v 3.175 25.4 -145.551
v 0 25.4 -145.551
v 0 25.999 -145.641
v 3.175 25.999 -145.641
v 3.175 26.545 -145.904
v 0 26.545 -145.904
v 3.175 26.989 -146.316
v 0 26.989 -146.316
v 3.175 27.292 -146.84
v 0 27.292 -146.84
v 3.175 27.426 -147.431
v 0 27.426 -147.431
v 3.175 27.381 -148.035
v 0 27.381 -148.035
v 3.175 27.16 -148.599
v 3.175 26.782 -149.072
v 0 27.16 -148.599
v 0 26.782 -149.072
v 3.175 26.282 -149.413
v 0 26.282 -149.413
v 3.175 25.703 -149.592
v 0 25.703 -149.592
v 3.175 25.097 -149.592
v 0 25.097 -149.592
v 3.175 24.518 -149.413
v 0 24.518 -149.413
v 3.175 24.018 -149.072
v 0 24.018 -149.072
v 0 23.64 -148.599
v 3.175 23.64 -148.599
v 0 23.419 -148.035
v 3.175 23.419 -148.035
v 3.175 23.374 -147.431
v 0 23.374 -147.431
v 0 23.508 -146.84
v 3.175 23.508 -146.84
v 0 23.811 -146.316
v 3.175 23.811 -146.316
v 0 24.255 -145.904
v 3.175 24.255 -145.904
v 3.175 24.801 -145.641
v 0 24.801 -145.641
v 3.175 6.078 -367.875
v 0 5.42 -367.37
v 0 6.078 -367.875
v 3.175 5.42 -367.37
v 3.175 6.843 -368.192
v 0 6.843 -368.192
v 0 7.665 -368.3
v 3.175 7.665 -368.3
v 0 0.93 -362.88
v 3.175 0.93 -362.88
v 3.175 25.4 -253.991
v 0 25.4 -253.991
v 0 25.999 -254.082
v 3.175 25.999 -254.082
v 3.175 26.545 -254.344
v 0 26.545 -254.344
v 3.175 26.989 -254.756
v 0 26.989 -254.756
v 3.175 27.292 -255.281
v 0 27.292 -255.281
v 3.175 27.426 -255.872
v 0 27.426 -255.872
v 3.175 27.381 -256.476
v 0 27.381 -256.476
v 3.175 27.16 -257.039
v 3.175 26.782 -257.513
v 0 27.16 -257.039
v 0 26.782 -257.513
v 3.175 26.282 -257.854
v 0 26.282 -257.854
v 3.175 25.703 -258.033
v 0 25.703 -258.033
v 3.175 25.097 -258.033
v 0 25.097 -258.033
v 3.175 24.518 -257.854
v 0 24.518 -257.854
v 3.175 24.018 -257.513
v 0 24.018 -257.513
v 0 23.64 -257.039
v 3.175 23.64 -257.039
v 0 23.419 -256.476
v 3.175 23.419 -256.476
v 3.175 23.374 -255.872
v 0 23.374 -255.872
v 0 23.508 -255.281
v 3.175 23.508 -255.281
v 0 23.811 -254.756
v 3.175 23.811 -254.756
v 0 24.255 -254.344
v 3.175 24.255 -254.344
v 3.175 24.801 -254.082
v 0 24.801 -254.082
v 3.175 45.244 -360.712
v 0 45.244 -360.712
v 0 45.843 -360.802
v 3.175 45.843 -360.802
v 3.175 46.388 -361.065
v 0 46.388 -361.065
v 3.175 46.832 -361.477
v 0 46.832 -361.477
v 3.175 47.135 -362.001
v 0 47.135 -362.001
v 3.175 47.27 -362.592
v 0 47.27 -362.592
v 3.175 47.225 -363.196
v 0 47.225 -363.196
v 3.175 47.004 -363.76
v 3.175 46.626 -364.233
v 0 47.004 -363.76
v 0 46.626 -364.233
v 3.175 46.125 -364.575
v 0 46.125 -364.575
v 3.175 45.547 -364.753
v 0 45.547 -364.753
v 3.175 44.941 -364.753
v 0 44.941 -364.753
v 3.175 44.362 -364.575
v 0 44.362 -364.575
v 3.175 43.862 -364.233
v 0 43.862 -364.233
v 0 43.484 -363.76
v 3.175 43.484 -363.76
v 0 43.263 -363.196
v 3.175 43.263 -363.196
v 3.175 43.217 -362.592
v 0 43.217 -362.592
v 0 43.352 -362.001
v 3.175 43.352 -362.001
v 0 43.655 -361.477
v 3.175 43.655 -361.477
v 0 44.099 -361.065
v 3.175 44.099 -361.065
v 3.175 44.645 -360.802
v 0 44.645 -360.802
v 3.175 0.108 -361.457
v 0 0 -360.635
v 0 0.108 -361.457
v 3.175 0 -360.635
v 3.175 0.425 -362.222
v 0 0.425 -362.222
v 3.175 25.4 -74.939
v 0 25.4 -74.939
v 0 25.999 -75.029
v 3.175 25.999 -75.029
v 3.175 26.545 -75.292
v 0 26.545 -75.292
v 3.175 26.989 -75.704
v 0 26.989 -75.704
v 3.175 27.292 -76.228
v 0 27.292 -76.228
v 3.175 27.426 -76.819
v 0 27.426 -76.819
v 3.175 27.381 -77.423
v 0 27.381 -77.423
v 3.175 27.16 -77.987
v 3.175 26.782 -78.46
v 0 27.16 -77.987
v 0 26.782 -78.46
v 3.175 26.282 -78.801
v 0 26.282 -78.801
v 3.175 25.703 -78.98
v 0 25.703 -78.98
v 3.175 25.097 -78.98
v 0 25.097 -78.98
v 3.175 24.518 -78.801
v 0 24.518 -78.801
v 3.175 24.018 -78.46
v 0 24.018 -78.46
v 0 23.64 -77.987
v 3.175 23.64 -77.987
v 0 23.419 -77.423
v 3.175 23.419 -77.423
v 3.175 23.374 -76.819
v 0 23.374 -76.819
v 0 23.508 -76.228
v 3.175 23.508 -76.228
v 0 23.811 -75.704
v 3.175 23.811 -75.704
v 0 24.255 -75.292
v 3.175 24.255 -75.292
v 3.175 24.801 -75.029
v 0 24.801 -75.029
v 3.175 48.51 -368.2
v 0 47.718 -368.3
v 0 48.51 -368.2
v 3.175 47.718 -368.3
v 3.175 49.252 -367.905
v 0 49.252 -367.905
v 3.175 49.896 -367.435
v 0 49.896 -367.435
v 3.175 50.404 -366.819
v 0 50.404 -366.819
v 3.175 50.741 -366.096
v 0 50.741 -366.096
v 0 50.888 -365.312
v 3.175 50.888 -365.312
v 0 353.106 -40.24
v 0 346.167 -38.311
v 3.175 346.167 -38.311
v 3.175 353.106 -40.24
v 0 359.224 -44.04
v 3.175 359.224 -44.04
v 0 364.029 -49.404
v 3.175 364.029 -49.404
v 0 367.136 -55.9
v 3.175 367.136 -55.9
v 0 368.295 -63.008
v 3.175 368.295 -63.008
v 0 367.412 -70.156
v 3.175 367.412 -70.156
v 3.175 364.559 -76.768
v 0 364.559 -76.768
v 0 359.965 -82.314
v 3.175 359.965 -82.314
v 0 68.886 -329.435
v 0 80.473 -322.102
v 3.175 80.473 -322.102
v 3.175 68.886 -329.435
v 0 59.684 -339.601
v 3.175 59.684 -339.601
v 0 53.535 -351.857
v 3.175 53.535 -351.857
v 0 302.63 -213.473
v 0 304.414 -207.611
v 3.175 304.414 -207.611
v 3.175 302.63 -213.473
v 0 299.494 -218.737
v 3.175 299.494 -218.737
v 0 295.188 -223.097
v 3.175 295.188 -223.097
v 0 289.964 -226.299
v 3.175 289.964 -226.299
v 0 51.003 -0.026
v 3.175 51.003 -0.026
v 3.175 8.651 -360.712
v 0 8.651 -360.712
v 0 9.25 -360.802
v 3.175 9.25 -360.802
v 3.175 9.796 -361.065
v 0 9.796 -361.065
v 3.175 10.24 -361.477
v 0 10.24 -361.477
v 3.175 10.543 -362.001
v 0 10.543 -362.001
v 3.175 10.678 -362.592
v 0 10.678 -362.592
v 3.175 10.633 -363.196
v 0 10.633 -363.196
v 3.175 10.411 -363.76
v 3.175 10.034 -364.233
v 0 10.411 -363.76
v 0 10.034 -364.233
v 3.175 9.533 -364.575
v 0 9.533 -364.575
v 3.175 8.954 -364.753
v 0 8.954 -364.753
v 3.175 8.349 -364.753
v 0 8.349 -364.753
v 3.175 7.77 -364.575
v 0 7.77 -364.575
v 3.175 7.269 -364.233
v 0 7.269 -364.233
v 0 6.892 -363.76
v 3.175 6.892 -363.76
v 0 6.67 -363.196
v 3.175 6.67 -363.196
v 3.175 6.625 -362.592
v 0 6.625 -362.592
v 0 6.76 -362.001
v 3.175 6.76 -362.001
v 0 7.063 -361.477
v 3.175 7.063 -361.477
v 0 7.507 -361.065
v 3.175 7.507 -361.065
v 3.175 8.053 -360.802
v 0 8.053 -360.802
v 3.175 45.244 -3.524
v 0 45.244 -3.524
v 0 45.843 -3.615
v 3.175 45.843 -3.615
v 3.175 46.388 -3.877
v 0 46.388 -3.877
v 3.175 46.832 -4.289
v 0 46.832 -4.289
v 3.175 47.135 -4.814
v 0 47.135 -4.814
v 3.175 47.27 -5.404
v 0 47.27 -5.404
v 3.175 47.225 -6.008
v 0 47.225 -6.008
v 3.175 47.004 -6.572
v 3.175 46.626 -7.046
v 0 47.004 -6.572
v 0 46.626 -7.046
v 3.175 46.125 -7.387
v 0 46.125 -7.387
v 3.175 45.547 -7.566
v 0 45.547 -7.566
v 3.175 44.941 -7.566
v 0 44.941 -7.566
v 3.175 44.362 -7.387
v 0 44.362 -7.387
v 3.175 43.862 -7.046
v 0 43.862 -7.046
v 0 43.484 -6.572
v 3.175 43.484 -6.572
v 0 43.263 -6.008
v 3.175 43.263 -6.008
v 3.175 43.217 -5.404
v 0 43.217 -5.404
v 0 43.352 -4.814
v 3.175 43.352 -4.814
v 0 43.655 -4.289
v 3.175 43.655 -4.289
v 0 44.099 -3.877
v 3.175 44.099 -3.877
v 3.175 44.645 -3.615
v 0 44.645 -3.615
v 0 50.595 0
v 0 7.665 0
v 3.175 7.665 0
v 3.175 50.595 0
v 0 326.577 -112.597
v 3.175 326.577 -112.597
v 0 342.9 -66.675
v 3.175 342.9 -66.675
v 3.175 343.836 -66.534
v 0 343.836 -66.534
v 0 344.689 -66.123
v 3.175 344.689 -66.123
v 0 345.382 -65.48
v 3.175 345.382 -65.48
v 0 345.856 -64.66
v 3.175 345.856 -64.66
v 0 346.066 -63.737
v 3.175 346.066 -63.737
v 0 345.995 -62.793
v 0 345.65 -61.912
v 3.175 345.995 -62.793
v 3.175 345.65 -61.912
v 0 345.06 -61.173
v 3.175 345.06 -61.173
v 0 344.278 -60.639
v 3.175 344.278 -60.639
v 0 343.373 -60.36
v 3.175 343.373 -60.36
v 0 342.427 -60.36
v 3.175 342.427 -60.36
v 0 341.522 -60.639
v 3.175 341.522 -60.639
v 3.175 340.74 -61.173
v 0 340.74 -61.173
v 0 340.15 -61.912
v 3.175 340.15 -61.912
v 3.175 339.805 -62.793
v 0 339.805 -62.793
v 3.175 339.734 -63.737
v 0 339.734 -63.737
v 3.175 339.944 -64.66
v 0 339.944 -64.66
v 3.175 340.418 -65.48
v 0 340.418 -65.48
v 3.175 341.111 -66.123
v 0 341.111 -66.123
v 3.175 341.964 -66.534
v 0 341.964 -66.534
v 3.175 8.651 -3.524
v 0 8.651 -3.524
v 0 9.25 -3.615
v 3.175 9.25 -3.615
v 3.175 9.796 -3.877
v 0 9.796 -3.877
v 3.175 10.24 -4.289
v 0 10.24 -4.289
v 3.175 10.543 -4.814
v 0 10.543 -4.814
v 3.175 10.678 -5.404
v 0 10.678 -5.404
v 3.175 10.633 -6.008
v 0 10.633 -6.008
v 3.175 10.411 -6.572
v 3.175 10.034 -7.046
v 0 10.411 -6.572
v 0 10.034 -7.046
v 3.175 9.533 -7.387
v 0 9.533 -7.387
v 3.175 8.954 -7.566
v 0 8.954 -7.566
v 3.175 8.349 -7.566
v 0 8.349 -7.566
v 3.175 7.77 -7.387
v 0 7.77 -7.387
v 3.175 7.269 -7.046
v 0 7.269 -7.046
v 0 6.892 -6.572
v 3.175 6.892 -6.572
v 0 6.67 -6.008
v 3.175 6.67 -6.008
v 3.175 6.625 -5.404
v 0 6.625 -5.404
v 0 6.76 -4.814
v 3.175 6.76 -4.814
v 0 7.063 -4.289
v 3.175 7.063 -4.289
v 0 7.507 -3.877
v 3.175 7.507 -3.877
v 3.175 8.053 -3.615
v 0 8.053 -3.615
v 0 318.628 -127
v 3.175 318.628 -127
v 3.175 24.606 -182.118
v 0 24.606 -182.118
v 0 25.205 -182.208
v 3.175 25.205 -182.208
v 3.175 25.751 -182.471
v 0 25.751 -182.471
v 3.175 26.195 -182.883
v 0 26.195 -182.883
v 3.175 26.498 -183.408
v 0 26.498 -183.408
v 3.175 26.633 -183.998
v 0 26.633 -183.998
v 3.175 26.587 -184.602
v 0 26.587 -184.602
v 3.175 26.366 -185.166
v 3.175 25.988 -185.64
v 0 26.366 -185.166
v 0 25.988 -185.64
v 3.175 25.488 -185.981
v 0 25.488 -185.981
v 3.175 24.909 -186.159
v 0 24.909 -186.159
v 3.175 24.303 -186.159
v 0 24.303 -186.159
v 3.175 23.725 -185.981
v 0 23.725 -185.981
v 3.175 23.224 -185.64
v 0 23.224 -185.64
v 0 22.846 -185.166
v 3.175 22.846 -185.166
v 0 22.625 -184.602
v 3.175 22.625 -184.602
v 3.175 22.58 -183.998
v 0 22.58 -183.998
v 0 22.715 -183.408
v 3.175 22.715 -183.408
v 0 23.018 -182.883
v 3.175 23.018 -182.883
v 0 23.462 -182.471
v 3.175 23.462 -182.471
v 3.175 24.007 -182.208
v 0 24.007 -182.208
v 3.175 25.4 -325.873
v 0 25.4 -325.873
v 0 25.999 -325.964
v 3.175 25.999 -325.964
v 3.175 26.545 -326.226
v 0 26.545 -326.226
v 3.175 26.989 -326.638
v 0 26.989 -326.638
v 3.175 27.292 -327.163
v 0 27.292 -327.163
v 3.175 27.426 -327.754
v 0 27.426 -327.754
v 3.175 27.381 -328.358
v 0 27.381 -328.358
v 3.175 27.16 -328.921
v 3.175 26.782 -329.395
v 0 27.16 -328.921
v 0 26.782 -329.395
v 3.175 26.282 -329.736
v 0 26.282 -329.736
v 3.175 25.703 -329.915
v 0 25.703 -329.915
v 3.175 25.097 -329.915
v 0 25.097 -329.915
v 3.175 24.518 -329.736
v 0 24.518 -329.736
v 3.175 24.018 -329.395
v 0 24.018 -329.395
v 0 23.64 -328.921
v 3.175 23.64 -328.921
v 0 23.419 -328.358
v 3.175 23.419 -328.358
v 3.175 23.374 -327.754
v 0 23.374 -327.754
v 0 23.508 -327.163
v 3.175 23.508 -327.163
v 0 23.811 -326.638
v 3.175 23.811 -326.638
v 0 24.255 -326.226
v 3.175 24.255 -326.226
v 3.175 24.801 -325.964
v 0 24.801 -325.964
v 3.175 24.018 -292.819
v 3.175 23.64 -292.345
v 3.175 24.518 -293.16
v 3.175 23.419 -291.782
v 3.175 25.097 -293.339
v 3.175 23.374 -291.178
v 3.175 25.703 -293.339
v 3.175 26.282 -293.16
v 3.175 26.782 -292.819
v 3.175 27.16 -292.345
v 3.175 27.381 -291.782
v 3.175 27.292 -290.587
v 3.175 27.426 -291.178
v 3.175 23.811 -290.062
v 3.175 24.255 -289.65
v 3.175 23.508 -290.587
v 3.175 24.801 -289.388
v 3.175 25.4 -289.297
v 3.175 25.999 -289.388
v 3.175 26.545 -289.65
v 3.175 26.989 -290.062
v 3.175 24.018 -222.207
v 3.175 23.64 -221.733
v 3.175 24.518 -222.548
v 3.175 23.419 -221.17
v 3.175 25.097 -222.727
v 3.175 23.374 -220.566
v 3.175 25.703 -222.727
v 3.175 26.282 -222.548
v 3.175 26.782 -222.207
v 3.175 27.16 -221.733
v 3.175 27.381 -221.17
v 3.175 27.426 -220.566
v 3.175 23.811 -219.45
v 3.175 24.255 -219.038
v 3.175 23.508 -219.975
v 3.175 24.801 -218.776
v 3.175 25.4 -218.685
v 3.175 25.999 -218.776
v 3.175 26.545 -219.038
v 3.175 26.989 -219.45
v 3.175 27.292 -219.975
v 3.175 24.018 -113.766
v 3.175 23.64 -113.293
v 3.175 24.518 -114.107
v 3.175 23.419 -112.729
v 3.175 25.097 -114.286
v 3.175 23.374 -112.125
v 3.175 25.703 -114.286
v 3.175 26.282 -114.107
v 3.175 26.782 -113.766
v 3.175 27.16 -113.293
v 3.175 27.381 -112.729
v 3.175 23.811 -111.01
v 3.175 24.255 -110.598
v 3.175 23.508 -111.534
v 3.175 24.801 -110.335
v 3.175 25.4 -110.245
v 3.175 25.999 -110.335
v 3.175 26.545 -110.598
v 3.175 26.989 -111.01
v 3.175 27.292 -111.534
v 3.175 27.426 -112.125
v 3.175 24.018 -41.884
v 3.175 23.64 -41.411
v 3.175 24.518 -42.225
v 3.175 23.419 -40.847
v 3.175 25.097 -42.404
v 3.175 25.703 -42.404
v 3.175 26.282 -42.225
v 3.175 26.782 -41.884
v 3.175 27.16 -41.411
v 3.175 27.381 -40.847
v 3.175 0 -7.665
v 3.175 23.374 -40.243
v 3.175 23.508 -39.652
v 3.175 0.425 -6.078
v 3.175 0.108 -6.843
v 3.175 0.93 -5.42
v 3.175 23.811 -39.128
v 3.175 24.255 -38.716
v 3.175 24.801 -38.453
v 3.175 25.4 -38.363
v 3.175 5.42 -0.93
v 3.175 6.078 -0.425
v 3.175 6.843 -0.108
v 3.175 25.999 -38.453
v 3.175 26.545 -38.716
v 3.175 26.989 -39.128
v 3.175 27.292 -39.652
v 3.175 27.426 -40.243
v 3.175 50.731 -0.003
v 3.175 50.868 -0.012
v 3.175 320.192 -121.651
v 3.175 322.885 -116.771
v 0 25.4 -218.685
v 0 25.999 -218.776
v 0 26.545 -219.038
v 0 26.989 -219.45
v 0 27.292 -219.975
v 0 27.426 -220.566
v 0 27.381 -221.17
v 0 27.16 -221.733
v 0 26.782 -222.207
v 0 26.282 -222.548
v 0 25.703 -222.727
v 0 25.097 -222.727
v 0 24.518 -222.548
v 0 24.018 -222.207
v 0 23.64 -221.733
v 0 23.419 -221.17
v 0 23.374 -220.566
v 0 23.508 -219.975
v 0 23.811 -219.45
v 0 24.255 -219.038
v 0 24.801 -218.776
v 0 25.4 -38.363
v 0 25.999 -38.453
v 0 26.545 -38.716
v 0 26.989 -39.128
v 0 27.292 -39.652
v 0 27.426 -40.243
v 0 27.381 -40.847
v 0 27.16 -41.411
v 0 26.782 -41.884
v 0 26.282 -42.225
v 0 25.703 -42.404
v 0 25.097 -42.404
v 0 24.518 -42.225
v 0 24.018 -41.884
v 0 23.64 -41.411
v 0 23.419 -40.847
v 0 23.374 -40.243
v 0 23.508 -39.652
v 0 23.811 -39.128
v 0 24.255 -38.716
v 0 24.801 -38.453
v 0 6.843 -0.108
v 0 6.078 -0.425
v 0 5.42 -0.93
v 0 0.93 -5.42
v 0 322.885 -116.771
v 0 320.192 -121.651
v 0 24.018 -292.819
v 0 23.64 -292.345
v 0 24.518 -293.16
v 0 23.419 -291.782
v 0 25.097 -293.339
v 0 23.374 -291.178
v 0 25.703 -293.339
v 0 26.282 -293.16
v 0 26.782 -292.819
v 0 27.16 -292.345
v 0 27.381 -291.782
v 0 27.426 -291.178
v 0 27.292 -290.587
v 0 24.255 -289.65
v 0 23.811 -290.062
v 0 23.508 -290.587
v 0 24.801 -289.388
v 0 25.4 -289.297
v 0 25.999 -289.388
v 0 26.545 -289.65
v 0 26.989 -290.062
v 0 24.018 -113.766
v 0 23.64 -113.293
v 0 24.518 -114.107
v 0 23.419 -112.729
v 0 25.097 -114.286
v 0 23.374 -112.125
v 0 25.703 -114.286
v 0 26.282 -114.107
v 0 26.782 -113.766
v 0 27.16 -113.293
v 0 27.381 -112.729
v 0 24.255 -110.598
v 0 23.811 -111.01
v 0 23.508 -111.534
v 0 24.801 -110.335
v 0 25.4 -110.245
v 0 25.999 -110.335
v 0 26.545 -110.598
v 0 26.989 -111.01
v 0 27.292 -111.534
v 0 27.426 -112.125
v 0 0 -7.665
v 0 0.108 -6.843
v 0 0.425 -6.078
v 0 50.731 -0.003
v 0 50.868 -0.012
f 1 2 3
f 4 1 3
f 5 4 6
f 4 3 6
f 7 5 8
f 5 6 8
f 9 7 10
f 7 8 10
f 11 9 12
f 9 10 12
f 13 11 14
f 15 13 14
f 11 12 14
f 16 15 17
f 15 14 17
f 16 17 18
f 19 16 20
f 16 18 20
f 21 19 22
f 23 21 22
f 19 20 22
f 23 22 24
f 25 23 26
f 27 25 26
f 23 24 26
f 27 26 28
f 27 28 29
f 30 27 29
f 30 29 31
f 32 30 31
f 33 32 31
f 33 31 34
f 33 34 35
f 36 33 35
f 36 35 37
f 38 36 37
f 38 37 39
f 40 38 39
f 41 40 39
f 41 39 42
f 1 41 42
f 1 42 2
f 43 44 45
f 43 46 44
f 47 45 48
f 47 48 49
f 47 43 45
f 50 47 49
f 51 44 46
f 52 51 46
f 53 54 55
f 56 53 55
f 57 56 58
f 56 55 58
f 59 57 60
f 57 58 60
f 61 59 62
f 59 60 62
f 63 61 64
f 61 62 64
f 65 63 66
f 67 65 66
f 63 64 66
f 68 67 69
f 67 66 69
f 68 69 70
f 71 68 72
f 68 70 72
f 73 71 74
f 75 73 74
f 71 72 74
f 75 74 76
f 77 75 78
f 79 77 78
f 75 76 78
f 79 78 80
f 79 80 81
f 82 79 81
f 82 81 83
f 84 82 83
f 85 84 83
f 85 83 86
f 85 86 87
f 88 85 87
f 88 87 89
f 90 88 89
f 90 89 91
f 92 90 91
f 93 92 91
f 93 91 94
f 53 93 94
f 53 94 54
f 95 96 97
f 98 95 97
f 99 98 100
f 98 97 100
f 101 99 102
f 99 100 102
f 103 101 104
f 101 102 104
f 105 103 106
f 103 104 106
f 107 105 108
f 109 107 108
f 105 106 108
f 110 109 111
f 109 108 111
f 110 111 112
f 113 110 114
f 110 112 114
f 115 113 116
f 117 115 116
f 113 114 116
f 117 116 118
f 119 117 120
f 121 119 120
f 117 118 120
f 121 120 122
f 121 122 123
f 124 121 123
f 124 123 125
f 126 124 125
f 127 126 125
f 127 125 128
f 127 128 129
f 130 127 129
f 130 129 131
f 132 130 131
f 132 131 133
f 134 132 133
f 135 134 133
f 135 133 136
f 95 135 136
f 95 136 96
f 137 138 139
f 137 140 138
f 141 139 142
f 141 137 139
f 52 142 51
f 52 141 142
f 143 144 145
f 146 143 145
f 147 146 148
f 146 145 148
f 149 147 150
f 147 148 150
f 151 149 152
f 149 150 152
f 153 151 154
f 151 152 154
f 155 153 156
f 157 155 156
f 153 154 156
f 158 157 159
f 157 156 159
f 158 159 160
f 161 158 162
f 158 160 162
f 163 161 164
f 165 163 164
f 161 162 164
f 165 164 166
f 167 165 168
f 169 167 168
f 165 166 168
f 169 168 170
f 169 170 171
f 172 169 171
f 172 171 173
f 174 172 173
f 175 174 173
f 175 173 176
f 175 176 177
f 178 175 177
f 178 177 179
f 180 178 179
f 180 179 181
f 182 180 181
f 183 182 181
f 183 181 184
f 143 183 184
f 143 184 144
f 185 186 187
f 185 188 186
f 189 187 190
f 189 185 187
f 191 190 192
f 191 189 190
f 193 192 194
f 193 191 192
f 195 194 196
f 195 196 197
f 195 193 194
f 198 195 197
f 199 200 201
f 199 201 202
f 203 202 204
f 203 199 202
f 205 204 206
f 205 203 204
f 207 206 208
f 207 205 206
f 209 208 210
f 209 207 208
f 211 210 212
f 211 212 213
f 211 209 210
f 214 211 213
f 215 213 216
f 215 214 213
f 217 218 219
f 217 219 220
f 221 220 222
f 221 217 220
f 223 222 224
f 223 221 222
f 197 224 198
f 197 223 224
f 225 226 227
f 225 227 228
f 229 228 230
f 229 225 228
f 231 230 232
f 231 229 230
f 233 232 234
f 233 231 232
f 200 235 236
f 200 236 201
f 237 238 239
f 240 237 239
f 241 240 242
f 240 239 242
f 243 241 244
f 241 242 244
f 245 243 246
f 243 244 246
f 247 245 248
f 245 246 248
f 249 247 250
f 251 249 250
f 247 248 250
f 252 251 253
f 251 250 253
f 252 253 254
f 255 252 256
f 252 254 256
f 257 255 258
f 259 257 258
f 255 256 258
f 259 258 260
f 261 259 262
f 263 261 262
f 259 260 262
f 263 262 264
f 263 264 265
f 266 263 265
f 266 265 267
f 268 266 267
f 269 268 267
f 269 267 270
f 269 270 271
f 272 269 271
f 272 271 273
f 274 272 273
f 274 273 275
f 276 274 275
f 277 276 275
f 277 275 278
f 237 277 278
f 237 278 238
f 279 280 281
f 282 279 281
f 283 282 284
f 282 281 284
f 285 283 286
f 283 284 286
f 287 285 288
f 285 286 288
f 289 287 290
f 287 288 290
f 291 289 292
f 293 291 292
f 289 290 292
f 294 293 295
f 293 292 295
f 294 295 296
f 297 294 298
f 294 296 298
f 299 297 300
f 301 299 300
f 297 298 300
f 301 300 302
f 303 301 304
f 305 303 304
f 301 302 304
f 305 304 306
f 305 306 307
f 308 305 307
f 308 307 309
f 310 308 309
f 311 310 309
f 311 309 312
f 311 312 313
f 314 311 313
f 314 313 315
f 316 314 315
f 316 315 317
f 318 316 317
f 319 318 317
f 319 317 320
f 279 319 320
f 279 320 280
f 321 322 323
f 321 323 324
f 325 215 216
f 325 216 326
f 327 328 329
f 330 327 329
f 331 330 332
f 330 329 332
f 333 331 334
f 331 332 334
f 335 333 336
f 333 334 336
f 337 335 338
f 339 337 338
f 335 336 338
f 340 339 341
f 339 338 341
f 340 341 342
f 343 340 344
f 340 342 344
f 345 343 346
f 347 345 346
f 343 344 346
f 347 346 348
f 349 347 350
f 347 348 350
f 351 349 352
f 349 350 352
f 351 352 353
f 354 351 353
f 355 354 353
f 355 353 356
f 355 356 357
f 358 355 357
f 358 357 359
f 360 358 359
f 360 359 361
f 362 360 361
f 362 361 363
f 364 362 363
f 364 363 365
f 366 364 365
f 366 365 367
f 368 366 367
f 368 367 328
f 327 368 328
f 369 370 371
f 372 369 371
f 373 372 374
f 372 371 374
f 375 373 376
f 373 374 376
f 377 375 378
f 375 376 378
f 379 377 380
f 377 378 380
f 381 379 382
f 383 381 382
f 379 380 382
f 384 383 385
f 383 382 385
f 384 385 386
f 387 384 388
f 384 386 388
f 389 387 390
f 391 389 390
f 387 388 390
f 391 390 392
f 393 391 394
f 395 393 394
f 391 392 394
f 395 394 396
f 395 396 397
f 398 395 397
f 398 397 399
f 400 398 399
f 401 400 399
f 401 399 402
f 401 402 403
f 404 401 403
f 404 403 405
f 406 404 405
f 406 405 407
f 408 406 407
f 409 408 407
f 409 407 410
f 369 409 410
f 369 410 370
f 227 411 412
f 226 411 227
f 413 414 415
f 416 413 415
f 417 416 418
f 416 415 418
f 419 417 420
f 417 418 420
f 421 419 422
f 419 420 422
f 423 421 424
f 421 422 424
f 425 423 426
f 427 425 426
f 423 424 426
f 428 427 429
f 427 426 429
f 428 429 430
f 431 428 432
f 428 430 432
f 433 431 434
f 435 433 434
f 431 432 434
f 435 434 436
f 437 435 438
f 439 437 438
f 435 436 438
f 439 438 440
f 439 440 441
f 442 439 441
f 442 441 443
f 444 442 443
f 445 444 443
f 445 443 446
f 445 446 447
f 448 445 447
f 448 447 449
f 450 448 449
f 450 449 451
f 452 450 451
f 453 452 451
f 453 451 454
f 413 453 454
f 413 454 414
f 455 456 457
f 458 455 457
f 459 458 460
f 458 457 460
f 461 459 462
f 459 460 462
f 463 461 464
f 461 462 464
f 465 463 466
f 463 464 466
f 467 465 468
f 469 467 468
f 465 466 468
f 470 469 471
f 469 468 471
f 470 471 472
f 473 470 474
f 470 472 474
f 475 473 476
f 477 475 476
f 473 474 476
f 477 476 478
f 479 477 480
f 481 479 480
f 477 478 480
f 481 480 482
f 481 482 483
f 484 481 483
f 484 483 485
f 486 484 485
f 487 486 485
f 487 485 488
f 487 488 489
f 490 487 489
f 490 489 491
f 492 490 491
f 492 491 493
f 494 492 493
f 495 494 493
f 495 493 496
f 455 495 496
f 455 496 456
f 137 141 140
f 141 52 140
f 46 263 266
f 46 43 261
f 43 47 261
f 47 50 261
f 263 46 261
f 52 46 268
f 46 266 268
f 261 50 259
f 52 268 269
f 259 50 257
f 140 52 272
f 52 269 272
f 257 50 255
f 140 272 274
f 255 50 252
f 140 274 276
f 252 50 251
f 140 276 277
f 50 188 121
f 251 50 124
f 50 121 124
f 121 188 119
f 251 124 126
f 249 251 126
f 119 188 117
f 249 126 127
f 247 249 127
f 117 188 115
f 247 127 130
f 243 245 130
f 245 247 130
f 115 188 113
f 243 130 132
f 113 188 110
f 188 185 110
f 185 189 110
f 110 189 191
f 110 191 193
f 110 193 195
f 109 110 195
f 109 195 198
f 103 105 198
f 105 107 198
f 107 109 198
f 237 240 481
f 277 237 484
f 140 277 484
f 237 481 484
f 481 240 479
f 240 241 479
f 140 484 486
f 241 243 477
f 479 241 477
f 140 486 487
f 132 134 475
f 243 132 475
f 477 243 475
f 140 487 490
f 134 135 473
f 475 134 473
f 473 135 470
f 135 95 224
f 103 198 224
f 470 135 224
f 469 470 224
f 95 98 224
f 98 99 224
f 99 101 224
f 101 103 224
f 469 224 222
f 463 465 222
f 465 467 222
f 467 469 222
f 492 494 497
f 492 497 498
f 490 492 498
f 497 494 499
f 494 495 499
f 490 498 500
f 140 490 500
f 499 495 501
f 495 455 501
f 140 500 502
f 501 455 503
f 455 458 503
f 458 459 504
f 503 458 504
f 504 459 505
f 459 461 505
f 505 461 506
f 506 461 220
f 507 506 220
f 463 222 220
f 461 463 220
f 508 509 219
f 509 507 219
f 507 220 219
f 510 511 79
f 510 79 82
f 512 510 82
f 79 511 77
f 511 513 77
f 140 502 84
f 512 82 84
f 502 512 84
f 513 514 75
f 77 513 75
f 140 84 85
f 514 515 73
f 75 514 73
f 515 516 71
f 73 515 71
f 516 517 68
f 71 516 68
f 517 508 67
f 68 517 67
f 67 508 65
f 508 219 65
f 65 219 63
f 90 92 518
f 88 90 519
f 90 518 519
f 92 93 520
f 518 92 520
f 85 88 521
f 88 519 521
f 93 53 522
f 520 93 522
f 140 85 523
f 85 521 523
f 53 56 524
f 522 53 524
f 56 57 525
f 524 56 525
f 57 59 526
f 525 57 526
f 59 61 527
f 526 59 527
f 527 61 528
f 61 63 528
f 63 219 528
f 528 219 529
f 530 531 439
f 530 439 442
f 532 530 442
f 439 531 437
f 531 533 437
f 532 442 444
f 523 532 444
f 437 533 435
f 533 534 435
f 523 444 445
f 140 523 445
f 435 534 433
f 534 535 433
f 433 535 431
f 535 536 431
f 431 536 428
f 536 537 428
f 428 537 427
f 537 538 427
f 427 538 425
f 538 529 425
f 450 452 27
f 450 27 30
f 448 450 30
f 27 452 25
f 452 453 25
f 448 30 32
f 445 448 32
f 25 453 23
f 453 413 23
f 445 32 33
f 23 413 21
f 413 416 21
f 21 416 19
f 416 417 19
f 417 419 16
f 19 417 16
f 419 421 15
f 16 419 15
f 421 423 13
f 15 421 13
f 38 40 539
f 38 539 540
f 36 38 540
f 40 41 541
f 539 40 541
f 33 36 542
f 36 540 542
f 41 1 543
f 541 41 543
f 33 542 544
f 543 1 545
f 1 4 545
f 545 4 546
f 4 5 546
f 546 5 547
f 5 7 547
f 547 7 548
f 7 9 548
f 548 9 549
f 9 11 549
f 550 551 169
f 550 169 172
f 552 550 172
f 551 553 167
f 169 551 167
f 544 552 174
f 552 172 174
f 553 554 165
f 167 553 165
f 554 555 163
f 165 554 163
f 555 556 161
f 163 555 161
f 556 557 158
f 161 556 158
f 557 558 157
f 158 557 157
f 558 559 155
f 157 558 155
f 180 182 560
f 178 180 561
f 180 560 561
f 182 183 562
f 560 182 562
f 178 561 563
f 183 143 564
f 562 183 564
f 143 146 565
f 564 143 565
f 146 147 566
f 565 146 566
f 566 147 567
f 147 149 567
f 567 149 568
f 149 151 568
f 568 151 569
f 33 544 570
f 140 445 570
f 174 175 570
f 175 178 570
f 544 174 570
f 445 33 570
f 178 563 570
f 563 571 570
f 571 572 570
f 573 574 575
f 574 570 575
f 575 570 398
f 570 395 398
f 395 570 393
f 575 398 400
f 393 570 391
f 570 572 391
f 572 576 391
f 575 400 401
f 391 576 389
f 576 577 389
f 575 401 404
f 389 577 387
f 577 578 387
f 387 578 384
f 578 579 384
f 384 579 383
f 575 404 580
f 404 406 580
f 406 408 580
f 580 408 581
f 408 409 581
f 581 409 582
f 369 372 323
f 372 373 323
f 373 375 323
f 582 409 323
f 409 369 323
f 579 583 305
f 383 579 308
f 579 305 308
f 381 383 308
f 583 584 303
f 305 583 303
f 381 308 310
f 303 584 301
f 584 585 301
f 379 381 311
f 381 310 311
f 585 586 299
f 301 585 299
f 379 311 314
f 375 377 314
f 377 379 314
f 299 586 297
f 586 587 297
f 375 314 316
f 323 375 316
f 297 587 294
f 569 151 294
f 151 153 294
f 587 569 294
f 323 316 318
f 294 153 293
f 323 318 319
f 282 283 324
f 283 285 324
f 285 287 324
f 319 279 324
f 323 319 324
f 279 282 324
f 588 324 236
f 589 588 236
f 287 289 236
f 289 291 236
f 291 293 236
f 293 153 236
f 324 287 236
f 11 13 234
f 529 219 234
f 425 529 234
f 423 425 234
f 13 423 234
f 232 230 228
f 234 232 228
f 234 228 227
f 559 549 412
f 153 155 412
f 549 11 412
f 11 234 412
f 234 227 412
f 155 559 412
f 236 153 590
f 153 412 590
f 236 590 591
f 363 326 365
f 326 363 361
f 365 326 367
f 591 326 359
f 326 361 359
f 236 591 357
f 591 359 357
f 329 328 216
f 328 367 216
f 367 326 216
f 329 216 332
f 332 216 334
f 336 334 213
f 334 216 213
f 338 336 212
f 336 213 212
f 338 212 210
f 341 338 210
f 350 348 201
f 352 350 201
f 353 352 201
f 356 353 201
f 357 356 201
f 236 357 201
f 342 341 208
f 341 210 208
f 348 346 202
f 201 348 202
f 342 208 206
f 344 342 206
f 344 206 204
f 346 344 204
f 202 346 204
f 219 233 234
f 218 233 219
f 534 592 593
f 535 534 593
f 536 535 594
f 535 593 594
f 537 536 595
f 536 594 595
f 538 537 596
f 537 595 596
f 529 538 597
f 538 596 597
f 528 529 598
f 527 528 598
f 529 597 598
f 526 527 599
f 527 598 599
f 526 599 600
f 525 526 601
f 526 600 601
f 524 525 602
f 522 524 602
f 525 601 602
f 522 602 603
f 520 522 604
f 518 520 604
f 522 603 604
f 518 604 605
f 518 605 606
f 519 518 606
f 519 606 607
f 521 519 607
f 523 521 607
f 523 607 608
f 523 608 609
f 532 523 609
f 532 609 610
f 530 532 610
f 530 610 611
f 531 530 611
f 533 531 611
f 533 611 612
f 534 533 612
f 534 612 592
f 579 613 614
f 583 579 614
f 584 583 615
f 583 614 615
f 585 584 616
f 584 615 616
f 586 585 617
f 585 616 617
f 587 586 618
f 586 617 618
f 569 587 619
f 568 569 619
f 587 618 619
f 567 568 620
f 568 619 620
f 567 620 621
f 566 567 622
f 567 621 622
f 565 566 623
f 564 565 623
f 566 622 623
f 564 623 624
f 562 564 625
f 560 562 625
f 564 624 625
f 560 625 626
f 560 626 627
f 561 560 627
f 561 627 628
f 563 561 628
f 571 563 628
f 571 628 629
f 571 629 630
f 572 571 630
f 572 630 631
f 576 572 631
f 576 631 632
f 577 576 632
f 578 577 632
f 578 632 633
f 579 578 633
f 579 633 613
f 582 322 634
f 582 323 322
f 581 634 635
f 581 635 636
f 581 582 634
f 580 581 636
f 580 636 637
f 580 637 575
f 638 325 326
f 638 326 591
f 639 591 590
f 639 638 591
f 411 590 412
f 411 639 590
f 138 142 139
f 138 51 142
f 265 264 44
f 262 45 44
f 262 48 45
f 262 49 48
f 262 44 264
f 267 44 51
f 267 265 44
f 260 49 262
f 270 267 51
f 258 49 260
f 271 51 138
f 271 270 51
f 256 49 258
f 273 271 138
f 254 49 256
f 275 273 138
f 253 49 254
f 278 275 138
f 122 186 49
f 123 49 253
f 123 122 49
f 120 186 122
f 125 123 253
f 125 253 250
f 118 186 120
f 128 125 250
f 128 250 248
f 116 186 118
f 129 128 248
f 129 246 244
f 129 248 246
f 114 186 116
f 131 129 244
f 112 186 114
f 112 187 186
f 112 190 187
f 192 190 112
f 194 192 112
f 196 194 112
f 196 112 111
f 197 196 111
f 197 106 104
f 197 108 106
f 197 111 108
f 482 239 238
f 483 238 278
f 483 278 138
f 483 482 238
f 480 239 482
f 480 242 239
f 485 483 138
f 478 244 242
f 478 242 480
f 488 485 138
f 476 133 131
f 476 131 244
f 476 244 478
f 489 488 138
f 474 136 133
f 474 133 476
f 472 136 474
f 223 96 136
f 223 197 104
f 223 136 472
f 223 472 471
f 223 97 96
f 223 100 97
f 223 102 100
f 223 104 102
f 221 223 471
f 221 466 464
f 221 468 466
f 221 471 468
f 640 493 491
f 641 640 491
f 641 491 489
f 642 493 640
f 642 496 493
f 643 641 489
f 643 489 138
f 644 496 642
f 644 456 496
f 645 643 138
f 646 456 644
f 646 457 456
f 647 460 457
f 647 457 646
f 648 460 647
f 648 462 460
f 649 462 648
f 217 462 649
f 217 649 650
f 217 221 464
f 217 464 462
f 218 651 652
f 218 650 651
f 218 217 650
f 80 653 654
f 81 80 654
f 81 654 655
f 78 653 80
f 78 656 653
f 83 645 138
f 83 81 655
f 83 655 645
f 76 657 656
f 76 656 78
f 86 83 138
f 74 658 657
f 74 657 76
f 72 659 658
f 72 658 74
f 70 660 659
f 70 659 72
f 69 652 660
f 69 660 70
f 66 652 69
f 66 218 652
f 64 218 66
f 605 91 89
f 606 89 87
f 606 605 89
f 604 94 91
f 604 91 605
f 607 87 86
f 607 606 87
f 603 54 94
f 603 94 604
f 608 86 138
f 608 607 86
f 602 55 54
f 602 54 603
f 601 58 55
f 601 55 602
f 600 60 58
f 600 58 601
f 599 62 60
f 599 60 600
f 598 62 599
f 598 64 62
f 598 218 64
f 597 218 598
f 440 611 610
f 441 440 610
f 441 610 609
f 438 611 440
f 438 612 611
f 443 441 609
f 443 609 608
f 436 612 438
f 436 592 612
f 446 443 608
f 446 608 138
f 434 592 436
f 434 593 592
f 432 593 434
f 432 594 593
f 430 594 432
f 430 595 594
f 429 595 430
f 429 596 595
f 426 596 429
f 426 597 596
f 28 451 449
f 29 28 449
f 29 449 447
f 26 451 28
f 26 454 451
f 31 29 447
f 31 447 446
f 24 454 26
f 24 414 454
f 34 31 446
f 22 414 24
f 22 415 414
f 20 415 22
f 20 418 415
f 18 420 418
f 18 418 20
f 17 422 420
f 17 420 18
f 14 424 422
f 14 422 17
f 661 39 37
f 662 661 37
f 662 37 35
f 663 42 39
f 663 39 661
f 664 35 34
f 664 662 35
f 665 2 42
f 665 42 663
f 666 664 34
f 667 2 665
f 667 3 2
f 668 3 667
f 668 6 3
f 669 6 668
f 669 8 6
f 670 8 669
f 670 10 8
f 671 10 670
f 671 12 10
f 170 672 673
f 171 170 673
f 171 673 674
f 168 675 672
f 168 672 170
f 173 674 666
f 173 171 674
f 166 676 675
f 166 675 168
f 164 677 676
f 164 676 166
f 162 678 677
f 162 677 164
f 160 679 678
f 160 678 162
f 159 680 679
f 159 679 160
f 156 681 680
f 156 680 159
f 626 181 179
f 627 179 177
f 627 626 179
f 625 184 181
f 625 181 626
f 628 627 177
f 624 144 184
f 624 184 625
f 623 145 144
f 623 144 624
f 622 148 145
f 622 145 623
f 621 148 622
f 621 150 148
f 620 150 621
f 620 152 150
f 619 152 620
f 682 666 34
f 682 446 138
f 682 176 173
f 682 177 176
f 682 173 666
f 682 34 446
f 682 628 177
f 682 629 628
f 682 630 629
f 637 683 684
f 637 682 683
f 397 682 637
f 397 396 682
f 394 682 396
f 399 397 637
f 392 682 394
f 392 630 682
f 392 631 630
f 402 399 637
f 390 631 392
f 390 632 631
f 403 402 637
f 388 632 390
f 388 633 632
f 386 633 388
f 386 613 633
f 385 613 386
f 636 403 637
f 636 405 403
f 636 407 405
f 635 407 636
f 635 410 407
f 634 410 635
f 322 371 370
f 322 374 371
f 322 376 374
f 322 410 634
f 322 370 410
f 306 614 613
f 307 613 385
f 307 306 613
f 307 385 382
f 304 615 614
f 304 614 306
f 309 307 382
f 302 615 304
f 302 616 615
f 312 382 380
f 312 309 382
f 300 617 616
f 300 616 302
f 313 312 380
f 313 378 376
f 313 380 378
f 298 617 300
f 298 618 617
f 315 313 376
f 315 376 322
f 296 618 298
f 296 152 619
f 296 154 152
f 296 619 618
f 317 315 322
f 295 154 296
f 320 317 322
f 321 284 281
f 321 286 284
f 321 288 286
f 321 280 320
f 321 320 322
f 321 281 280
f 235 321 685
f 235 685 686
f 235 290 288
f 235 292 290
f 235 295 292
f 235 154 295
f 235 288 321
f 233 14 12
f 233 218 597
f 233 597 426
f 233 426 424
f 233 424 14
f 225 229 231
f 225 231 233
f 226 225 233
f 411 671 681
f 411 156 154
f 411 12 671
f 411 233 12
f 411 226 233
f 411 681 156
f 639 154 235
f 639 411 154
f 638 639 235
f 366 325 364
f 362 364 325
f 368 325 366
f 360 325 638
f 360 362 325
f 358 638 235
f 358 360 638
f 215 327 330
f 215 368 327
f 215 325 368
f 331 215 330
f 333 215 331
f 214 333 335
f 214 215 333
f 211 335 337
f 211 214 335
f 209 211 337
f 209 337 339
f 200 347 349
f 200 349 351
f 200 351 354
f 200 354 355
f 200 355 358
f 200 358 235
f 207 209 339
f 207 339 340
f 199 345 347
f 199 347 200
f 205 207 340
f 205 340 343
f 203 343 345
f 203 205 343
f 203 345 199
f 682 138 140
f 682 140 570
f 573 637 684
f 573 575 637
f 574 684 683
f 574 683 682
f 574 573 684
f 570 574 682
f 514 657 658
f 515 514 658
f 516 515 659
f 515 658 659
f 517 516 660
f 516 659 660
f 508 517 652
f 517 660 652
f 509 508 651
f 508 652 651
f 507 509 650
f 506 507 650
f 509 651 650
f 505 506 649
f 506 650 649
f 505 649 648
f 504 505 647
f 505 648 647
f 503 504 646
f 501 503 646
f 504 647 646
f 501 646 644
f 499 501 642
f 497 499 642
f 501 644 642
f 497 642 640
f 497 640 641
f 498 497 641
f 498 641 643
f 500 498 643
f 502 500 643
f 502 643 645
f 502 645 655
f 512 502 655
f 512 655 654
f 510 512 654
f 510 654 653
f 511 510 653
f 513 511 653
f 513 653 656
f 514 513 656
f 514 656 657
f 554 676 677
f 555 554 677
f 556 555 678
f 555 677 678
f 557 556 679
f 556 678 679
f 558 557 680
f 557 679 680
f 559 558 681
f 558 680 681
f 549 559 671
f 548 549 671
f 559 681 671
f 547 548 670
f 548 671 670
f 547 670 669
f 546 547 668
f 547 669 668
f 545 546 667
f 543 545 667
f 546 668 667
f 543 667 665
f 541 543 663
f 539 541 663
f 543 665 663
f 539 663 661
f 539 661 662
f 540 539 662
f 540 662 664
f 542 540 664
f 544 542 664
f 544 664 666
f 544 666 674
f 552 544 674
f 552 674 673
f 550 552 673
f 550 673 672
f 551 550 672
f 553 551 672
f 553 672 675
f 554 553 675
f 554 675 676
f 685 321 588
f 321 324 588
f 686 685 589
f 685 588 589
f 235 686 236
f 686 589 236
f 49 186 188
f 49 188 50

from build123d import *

# Parameters (mm, degrees)
PLATE_DEPTH                = 3.175
DRIVE_HOLES_D              = 4.064
SKETCH3_R                  = 3.175
TUBE_PIVOT_HOLES_DEPTH     = 521.864531932
BOTTOM_CORNER_CHAMFER_SIZE = 6.35
BOTTOM_CORNER_FILLET_R     = 3.175
CARBON_CAP_HOLES_D         = 4.064


with BuildPart() as part:
    # Sketch2 → Plate (new body)
    with BuildSketch(Plane(origin=(0, 0, 0), x_dir=(0, 0, -1), z_dir=(1, 0, 0))):
        with BuildLine():
            Line((0, 0), (0, 50.8))
            Line((0, 50.8), (38.311002826, 346.167173299))
            ThreePointArc((38.311002826, 346.167173299), (55.900445741, 367.136476127), (82.313788673, 359.96462293))
            Line((82.313788673, 359.96462293), (112.596875039, 326.577445868))
            ThreePointArc((112.596875039, 326.577445868), (119.137016705, 321.404317358), (127, 318.627951872))
            Line((127, 318.627951872), (207.610663713, 304.414116927))
            ThreePointArc((207.610663713, 304.414116927), (218.737141463, 299.493711333), (226.299177538, 289.963522))
            Line((226.299177538, 289.963522), (322.101644923, 80.472956))
            ThreePointArc((322.101644923, 80.472956), (340.846528773, 58.857200401), (368.3, 50.8))
            Line((368.3, 50.8), (368.3, 0))
            Line((368.3, 0), (0, 0))
        make_face()
    extrude(amount=PLATE_DEPTH)

    # Drive Holes (through all)
    with Locations(Plane(origin=(3.175, 0, 0), x_dir=(0, 0, -1), z_dir=(1, 0, 0))):
        with Locations((184.15, 24.60625), (220.717386247, 25.4), (256.023386247, 25.4), (291.329386247, 25.4), (327.905386247, 25.4), (147.582613753, 25.4), (112.276613753, 25.4), (76.970613753, 25.4), (40.394613753, 25.4)):
            Hole(DRIVE_HOLES_D / 2)

    # Sketch3 → Tube Pivot Holes (cut, through all)
    with BuildSketch(Plane(origin=(3.175, 0, 0), x_dir=(0, 0, -1), z_dir=(1, 0, 0))):
        with Locations((63.5, 342.9)):
            Circle(SKETCH3_R)
    extrude(amount=-TUBE_PIVOT_HOLES_DEPTH, mode=Mode.SUBTRACT)

    # Bottom Corner Chamfer
    bottom_corner_chamfer_edges = [part.edges().sort_by_distance(p)[0] for p in [
        (1.5875, 0, 0),
        (1.5875, 0, -368.3),
    ]]
    chamfer(bottom_corner_chamfer_edges, length=BOTTOM_CORNER_CHAMFER_SIZE)

    # Bottom Corner Fillet
    bottom_corner_fillet_edges = [part.edges().sort_by_distance(p)[0] for p in [
        (1.5875, 0, -6.35),
        (1.5875, 0, -361.95),
        (1.5875, 6.35, 0),
        (1.5875, 50.8, 0),
        (1.5875, 50.8, -368.3),
        (1.5875, 6.35, -368.3),
    ]]
    fillet(bottom_corner_fillet_edges, radius=BOTTOM_CORNER_FILLET_R)

    # Carbon Cap Holes (through all)
    with Locations(Plane(origin=(3.175, 0, 0), x_dir=(0, 0, -1), z_dir=(1, 0, 0))):
        with Locations((5.55625, 45.24375), (5.55625, 8.651474106), (362.74375, 45.24375), (362.74375, 8.651474106)):
            Hole(CARBON_CAP_HOLES_D / 2)


solid = part.part
